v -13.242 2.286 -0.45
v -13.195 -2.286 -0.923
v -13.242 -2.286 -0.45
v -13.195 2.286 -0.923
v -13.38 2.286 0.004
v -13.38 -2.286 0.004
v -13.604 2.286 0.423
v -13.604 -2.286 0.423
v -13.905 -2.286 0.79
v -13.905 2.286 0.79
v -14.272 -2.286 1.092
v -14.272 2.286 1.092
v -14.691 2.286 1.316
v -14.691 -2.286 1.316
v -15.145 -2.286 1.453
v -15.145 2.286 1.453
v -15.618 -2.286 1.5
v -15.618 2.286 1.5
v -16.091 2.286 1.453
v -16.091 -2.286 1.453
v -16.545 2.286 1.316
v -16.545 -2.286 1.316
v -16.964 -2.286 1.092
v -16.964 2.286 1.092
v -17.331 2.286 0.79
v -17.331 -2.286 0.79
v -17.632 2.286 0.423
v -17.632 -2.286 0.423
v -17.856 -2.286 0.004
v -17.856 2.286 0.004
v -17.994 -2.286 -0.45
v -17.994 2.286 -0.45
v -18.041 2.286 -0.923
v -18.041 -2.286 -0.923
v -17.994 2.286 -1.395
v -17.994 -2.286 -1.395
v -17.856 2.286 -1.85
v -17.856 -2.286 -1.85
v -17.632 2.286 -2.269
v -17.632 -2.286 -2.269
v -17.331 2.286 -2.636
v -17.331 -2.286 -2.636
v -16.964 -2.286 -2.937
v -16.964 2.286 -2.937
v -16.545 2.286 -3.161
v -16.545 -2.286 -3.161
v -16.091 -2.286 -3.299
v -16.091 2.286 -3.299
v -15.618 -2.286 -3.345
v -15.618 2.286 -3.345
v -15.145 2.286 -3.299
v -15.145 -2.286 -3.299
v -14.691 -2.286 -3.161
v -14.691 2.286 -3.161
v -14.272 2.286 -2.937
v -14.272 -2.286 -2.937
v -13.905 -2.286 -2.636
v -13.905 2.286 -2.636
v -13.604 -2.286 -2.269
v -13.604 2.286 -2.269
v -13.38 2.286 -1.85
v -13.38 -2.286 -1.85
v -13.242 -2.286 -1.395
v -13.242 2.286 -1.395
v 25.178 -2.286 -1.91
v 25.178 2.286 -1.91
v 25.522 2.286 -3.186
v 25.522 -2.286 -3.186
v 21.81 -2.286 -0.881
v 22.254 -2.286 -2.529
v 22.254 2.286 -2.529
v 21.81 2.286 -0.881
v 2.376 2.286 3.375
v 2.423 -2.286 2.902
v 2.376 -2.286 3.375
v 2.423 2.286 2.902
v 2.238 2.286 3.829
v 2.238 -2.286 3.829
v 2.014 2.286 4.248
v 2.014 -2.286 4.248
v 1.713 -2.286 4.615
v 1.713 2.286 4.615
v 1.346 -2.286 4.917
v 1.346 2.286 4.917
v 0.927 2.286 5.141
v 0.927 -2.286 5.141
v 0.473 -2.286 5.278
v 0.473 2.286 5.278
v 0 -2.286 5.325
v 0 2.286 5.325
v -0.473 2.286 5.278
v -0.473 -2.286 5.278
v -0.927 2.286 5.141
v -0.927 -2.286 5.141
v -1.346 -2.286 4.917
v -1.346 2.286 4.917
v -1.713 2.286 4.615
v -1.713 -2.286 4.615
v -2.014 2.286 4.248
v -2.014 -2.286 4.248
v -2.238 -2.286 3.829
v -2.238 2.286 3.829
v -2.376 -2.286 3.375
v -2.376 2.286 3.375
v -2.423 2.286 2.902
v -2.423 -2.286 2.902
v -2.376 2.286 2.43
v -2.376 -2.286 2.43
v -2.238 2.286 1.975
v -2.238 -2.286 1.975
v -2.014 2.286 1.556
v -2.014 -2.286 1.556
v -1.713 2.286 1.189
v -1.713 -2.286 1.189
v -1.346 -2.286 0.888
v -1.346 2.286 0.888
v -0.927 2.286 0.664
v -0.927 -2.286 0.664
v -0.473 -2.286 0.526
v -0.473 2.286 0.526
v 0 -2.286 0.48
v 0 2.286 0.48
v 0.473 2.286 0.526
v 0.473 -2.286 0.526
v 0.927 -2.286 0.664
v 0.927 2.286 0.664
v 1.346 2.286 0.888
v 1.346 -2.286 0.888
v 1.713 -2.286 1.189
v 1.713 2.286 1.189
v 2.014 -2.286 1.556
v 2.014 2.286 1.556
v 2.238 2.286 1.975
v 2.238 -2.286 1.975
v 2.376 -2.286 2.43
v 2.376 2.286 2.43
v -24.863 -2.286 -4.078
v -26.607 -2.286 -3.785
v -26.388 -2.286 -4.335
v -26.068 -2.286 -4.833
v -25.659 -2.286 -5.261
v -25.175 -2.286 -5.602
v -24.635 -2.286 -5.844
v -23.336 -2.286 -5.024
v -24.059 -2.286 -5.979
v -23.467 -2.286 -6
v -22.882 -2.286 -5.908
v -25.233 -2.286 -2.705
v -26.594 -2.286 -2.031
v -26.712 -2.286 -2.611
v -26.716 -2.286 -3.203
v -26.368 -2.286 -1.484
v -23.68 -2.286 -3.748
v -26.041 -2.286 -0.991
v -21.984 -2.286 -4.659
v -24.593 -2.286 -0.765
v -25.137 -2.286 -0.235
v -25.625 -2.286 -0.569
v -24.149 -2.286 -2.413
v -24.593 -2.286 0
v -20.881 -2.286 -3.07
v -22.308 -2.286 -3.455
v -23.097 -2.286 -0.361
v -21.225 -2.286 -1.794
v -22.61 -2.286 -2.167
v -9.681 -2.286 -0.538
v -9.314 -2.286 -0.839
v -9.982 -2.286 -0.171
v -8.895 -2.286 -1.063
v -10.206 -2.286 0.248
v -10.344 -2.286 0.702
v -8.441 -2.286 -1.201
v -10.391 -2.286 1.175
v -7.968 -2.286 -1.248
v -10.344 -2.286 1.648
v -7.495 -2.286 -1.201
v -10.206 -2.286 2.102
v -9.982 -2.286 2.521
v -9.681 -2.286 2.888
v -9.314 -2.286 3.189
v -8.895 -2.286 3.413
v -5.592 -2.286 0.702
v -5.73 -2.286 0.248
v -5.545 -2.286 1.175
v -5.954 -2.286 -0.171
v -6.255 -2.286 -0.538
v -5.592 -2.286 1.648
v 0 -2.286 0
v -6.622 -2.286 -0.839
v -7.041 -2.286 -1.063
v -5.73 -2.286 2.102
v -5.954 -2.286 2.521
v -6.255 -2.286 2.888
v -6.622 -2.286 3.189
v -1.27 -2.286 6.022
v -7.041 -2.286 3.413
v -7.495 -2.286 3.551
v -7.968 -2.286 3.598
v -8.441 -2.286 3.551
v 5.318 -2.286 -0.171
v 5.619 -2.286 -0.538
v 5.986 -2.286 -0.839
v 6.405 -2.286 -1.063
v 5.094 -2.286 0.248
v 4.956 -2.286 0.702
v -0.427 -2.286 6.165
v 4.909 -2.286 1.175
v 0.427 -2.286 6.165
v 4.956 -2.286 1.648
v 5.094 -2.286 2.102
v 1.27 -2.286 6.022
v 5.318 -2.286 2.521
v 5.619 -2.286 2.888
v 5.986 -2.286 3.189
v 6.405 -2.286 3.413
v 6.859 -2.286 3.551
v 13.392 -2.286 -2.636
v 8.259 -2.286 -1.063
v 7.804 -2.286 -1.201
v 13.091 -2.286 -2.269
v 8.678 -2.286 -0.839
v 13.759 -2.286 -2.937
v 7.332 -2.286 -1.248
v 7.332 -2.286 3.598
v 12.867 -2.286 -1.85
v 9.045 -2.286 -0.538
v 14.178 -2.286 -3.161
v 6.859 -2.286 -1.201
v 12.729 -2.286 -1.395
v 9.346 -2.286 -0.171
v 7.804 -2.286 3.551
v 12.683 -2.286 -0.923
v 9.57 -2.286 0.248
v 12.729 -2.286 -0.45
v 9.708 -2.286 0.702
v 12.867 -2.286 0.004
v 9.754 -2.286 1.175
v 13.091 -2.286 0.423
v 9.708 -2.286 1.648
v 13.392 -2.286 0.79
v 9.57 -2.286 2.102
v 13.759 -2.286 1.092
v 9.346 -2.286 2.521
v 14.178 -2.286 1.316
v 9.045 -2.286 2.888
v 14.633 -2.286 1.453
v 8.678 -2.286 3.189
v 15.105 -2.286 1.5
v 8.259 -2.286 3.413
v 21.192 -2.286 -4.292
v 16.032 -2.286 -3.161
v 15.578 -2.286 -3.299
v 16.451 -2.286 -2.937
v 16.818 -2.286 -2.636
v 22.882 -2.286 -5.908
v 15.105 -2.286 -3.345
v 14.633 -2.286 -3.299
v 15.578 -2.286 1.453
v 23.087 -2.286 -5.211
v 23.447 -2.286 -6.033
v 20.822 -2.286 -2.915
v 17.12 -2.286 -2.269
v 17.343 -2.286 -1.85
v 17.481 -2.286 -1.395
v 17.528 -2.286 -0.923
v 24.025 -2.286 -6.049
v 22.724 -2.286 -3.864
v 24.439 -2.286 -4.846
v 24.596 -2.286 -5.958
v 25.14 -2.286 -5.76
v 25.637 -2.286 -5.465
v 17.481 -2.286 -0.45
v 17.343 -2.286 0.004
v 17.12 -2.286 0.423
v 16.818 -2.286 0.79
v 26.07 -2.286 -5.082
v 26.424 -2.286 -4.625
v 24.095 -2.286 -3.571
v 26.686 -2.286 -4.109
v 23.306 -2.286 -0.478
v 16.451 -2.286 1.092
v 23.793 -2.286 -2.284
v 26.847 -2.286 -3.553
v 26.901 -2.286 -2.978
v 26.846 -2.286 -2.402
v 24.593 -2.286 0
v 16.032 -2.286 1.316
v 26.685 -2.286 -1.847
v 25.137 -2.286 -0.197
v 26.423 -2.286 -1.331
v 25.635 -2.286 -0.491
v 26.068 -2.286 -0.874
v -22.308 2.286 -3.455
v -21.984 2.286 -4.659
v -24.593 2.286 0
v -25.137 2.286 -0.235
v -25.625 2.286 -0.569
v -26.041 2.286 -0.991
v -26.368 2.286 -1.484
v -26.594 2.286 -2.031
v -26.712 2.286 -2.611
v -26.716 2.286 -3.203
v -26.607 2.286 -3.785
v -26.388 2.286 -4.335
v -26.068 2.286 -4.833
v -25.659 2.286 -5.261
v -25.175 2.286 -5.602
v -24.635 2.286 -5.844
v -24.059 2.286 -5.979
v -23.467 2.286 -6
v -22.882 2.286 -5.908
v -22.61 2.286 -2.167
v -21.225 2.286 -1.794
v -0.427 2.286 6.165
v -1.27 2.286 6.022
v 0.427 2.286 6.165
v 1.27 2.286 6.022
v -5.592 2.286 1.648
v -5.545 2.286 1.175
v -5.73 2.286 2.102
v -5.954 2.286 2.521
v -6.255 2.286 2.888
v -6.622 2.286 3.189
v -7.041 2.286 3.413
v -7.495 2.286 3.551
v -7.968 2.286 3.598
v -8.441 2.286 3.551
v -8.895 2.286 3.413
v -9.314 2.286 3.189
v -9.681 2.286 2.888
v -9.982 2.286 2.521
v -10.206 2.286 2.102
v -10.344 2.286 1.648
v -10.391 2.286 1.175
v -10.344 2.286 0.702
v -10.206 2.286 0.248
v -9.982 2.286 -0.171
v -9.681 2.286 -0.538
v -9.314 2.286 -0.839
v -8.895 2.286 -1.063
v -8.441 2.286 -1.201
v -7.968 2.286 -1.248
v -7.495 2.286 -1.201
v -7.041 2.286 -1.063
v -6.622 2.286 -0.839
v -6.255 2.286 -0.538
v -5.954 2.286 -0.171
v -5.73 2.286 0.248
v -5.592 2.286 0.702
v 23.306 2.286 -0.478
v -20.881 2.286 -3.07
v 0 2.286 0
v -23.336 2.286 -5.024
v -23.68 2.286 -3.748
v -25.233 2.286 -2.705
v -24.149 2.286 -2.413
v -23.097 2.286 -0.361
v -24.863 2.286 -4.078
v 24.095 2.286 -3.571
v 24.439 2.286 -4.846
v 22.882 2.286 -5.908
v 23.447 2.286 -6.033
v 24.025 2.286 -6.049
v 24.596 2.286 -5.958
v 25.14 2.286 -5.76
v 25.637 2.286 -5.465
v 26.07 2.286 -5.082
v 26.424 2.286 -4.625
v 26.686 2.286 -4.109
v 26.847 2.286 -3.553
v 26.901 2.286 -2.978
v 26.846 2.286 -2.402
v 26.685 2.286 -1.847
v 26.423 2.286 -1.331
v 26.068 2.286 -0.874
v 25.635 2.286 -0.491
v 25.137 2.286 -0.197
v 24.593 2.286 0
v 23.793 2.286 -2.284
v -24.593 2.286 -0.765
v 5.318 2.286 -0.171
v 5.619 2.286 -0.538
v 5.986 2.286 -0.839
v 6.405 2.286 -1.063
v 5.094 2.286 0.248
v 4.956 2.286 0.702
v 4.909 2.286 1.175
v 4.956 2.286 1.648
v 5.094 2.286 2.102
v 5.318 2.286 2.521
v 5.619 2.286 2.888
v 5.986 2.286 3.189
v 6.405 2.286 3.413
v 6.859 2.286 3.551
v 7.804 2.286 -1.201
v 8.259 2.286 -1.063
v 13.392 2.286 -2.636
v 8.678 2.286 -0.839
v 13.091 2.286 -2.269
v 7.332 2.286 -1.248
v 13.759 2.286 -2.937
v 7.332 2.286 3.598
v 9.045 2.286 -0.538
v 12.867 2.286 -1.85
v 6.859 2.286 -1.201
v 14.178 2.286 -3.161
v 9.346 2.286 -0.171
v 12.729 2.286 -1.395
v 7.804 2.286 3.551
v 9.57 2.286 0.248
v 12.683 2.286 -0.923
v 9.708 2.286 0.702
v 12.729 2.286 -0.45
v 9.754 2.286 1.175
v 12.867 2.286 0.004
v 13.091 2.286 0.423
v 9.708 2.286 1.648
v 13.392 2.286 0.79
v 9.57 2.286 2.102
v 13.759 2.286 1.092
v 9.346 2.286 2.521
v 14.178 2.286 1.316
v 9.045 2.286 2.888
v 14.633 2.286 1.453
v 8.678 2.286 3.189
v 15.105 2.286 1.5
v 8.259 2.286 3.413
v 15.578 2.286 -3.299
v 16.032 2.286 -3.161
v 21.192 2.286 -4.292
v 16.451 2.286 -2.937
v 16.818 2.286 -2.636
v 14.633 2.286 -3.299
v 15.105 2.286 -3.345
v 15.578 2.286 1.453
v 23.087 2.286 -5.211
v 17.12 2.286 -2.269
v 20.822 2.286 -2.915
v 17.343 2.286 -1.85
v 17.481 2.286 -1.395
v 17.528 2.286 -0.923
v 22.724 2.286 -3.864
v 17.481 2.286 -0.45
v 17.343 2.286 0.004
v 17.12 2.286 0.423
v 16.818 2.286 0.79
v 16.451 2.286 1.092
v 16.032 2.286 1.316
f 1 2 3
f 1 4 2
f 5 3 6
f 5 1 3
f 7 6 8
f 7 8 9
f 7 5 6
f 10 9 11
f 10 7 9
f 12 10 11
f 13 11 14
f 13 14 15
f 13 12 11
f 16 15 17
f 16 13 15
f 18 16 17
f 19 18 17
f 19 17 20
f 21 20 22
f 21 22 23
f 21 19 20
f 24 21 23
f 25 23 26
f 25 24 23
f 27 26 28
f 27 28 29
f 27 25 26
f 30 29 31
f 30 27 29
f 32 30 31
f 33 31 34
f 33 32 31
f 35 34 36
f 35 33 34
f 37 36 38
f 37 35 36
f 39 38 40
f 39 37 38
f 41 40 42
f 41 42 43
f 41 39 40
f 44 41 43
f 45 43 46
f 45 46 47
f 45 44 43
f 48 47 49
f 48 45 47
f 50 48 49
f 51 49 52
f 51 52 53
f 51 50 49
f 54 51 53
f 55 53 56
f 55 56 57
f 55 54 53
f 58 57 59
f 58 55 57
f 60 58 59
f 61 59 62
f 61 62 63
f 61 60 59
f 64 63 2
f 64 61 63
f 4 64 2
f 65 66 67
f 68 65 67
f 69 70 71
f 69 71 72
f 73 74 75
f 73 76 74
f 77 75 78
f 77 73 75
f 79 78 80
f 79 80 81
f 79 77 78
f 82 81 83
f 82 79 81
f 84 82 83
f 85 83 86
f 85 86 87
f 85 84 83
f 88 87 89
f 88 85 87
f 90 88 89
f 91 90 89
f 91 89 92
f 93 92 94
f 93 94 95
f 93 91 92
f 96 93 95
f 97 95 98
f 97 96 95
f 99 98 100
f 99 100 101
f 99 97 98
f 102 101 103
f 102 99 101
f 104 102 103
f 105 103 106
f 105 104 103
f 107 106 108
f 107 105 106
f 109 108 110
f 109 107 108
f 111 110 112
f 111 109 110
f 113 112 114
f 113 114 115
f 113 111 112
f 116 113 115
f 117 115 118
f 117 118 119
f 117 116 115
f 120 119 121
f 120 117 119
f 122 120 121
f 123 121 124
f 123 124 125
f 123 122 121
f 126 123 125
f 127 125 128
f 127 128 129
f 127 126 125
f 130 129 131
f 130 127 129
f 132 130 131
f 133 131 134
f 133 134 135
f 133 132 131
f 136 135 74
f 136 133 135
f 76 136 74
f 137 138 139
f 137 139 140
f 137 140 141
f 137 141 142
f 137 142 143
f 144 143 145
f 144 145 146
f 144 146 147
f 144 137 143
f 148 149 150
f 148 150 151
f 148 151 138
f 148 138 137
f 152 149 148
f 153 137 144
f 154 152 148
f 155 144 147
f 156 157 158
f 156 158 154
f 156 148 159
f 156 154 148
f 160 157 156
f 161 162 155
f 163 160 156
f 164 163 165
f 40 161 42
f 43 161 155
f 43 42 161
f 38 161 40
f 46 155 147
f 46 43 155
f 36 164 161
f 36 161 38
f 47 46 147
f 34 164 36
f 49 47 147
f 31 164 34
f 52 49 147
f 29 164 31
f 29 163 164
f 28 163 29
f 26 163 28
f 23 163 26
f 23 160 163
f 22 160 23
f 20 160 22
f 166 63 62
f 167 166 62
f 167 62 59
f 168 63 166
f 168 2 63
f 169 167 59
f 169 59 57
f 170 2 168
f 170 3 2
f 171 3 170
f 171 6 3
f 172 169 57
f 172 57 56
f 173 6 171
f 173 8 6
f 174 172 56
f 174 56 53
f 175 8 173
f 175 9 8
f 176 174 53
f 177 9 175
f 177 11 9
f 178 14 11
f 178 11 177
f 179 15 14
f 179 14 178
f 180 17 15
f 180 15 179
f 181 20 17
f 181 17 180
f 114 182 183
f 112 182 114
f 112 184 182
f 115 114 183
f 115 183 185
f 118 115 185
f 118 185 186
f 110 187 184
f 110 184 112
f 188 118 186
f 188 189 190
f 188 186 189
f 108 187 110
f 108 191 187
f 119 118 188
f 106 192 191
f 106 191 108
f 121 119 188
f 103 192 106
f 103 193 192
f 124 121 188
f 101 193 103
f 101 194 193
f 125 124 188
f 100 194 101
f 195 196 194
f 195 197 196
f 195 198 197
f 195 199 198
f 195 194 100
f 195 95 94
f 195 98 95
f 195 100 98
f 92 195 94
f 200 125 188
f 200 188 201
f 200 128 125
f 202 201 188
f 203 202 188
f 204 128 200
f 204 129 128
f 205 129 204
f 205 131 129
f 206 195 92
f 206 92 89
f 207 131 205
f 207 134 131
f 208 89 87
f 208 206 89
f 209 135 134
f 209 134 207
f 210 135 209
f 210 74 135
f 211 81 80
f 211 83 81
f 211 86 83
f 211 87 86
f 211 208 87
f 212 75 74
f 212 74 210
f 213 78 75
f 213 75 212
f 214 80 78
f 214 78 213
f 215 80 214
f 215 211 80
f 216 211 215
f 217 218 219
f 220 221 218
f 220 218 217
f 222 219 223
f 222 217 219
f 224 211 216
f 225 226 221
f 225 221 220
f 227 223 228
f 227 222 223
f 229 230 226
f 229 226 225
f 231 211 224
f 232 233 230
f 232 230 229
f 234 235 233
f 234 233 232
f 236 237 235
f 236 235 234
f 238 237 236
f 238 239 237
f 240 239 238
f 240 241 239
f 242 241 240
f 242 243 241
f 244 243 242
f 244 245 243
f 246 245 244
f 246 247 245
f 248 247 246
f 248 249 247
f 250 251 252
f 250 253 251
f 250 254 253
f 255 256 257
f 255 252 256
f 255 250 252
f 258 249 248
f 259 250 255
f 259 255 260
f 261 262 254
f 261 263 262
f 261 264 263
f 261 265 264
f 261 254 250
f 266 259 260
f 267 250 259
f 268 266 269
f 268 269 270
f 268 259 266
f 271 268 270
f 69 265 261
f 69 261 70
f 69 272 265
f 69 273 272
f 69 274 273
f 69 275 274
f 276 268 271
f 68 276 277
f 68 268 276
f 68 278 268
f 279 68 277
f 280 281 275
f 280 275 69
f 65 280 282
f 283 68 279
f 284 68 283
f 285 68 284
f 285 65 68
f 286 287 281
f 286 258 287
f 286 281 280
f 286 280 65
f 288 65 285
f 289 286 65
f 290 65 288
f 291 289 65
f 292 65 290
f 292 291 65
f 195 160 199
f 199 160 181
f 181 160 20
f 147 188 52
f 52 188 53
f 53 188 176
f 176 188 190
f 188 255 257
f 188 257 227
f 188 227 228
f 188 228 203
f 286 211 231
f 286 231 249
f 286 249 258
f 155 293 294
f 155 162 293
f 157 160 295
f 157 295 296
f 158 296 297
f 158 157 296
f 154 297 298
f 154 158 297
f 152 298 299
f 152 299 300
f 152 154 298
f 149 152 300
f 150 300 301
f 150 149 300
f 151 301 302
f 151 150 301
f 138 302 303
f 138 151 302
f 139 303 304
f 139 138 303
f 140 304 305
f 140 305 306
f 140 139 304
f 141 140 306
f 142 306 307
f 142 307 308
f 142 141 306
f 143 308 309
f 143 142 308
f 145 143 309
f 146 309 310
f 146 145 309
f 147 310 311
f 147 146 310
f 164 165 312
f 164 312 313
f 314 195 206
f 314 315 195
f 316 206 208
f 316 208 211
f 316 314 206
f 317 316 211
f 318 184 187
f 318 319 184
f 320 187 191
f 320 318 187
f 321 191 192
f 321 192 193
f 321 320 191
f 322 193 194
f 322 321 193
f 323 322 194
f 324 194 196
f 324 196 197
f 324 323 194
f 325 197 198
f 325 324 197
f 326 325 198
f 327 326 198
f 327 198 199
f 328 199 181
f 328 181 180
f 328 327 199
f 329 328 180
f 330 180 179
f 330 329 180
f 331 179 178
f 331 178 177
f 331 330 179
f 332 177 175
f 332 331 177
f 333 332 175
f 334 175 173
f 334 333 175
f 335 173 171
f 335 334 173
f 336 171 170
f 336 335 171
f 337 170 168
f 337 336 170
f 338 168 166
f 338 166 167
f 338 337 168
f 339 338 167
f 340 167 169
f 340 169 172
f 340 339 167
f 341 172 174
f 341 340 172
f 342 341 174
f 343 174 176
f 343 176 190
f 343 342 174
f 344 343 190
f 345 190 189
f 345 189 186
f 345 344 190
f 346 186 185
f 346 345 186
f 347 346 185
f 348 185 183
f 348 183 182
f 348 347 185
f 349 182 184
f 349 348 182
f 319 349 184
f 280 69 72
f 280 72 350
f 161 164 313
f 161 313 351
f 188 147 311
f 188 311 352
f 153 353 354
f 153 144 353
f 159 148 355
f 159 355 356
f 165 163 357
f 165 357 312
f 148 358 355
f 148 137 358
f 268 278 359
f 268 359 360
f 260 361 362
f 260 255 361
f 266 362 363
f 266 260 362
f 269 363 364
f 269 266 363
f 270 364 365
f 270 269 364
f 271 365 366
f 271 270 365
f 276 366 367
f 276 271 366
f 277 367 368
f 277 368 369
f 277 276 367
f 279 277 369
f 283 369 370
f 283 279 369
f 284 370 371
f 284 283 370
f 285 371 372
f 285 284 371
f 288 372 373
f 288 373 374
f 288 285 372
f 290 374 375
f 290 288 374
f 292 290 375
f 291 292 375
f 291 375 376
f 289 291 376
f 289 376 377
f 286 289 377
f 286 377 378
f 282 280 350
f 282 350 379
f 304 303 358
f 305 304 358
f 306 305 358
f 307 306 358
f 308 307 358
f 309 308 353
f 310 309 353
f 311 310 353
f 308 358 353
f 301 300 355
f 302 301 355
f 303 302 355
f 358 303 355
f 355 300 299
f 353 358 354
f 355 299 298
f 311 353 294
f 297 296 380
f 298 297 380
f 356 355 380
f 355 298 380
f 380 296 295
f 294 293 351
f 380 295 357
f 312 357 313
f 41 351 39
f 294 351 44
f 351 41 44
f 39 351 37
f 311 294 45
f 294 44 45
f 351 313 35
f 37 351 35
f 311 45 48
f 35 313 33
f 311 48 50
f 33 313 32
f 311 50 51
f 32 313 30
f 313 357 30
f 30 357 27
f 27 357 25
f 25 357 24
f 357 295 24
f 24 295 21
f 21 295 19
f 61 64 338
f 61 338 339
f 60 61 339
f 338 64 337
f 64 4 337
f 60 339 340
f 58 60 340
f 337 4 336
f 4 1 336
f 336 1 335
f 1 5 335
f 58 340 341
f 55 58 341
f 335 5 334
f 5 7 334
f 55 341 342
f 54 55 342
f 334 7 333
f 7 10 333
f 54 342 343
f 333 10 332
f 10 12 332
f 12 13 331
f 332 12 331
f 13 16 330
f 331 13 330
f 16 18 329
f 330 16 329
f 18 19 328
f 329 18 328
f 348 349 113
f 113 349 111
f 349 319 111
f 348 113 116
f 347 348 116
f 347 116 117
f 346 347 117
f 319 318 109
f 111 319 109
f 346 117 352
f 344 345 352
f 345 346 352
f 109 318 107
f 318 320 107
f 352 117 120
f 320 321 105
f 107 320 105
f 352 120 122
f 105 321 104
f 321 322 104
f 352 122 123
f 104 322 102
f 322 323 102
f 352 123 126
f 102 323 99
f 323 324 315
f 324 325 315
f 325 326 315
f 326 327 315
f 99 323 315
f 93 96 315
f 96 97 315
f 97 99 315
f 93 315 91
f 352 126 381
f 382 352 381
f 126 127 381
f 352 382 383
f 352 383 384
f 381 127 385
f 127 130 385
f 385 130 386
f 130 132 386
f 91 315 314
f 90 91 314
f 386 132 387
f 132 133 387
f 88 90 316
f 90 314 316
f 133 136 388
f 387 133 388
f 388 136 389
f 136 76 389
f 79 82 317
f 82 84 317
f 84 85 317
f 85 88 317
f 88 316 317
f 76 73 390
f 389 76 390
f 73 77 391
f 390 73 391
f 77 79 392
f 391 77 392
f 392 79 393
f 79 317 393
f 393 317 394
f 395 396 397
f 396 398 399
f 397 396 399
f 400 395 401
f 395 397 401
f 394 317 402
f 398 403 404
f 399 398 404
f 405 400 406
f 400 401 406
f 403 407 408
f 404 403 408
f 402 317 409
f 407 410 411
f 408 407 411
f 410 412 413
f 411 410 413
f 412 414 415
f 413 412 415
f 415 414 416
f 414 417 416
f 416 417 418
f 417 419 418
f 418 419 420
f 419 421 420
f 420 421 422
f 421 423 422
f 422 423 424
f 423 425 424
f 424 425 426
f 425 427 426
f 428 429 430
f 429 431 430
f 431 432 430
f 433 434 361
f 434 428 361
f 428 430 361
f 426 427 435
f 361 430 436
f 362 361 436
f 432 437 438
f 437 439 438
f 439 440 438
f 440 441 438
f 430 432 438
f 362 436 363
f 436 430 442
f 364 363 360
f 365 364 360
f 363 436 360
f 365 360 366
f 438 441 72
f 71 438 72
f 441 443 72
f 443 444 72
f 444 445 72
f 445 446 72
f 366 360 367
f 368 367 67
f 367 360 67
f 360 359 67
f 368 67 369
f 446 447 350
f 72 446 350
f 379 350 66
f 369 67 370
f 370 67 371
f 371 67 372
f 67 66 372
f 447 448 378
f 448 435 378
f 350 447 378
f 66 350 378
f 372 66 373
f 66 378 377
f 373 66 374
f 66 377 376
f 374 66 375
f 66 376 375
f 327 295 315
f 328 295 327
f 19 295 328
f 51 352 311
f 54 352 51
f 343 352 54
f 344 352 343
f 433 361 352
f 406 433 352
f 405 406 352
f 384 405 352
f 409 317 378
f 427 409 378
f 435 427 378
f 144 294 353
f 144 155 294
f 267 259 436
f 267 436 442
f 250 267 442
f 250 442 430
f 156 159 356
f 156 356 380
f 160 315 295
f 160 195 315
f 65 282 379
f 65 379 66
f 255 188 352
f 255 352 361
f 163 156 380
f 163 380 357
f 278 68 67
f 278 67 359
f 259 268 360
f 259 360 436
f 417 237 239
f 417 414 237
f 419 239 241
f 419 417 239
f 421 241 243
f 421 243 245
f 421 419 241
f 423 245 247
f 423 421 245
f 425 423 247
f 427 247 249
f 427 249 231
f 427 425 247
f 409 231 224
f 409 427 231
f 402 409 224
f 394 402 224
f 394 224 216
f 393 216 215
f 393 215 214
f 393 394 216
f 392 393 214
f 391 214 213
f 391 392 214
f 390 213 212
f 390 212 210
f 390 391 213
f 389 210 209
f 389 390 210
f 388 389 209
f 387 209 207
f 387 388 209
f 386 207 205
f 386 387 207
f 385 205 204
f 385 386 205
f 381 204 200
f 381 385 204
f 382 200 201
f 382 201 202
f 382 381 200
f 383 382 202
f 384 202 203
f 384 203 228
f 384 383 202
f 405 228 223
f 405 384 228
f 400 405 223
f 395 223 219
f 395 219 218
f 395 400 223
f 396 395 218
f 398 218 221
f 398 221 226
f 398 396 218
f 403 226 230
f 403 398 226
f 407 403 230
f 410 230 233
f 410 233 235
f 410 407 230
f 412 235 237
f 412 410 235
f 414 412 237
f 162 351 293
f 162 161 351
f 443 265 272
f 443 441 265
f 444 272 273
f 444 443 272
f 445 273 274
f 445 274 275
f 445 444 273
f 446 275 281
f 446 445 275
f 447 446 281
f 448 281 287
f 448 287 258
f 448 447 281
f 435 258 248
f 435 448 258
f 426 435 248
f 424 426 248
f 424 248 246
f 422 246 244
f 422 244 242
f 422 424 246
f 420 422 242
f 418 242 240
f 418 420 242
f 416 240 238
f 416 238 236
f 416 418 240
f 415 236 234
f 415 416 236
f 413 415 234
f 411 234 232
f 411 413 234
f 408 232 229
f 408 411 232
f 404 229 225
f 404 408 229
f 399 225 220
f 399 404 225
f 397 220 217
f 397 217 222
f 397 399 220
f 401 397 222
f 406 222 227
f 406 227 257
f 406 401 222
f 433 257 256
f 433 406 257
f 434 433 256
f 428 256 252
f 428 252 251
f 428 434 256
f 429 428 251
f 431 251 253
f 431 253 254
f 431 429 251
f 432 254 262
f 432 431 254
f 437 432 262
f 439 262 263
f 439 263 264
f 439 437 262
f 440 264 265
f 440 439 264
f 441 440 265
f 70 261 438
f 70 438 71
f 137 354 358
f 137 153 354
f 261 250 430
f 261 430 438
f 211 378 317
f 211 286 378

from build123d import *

# Parameters (mm, degrees)
F0_R     = 2.42261
F1_DEPTH = 2.286
F2_R     = 5.08


with BuildPart() as f1:
    # F0 (on Front) → F1 (new body, symmetric)
    with BuildSketch(Plane.XZ):
        with BuildLine():
            Line((0, 6.35), (-24.593444, 0))
            ThreePointArc((-24.593444, 0), (-26.606894, -3.785008), (-22.882334, -5.908193))
            Line((-22.882334, -5.908193), (0, 0))
            Line((0, 0), (22.882336, -5.908194))
            ThreePointArc((22.882336, -5.908194), (26.779601, -3.835026), (24.593444, 0))
            Line((24.593444, 0), (0, 6.35))
        make_face()
        Polygon((-25.233058, -2.70493), (-24.149164, -2.412652), (-24.593444, -0.765068), (-23.096818, -0.361495), (-22.609838, -2.167426), (-21.225002, -1.793997), (-20.880997, -3.069718), (-22.308412, -3.454628), (-21.983574, -4.659269), (-23.335583, -5.023846), (-23.679588, -3.748126), (-24.862724, -4.07829), align=None, mode=Mode.SUBTRACT)
        with Locations((-15.617909, -0.922615)):
            Circle(F0_R, mode=Mode.SUBTRACT)
        Polygon((20.821678, -2.915041), (22.254047, -2.528795), (21.809766, -0.881211), (23.306393, -0.477637), (23.793373, -2.283569), (25.178209, -1.91014), (25.522214, -3.18586), (24.094798, -3.570771), (24.43871, -4.846144), (23.086701, -5.210721), (22.723623, -3.864269), (21.192243, -4.291613), align=None, mode=Mode.SUBTRACT)
        with Locations((15.105182, -0.922615)):
            Circle(F0_R, mode=Mode.SUBTRACT)
        with Locations((-7.967982, 1.174946)):
            Circle(F0_R, mode=Mode.SUBTRACT)
        with Locations((0, 2.902348)):
            Circle(F0_R, mode=Mode.SUBTRACT)
        with Locations((7.33187, 1.174946)):
            Circle(F0_R, mode=Mode.SUBTRACT)
    extrude(amount=F1_DEPTH, both=True)

    # F2
    f2_edges = [f1.edges().sort_by_distance(p)[0] for p in [
        (0, 0, 6.35),
    ]]
    fillet(f2_edges, radius=F2_R)


solid = f1.part
